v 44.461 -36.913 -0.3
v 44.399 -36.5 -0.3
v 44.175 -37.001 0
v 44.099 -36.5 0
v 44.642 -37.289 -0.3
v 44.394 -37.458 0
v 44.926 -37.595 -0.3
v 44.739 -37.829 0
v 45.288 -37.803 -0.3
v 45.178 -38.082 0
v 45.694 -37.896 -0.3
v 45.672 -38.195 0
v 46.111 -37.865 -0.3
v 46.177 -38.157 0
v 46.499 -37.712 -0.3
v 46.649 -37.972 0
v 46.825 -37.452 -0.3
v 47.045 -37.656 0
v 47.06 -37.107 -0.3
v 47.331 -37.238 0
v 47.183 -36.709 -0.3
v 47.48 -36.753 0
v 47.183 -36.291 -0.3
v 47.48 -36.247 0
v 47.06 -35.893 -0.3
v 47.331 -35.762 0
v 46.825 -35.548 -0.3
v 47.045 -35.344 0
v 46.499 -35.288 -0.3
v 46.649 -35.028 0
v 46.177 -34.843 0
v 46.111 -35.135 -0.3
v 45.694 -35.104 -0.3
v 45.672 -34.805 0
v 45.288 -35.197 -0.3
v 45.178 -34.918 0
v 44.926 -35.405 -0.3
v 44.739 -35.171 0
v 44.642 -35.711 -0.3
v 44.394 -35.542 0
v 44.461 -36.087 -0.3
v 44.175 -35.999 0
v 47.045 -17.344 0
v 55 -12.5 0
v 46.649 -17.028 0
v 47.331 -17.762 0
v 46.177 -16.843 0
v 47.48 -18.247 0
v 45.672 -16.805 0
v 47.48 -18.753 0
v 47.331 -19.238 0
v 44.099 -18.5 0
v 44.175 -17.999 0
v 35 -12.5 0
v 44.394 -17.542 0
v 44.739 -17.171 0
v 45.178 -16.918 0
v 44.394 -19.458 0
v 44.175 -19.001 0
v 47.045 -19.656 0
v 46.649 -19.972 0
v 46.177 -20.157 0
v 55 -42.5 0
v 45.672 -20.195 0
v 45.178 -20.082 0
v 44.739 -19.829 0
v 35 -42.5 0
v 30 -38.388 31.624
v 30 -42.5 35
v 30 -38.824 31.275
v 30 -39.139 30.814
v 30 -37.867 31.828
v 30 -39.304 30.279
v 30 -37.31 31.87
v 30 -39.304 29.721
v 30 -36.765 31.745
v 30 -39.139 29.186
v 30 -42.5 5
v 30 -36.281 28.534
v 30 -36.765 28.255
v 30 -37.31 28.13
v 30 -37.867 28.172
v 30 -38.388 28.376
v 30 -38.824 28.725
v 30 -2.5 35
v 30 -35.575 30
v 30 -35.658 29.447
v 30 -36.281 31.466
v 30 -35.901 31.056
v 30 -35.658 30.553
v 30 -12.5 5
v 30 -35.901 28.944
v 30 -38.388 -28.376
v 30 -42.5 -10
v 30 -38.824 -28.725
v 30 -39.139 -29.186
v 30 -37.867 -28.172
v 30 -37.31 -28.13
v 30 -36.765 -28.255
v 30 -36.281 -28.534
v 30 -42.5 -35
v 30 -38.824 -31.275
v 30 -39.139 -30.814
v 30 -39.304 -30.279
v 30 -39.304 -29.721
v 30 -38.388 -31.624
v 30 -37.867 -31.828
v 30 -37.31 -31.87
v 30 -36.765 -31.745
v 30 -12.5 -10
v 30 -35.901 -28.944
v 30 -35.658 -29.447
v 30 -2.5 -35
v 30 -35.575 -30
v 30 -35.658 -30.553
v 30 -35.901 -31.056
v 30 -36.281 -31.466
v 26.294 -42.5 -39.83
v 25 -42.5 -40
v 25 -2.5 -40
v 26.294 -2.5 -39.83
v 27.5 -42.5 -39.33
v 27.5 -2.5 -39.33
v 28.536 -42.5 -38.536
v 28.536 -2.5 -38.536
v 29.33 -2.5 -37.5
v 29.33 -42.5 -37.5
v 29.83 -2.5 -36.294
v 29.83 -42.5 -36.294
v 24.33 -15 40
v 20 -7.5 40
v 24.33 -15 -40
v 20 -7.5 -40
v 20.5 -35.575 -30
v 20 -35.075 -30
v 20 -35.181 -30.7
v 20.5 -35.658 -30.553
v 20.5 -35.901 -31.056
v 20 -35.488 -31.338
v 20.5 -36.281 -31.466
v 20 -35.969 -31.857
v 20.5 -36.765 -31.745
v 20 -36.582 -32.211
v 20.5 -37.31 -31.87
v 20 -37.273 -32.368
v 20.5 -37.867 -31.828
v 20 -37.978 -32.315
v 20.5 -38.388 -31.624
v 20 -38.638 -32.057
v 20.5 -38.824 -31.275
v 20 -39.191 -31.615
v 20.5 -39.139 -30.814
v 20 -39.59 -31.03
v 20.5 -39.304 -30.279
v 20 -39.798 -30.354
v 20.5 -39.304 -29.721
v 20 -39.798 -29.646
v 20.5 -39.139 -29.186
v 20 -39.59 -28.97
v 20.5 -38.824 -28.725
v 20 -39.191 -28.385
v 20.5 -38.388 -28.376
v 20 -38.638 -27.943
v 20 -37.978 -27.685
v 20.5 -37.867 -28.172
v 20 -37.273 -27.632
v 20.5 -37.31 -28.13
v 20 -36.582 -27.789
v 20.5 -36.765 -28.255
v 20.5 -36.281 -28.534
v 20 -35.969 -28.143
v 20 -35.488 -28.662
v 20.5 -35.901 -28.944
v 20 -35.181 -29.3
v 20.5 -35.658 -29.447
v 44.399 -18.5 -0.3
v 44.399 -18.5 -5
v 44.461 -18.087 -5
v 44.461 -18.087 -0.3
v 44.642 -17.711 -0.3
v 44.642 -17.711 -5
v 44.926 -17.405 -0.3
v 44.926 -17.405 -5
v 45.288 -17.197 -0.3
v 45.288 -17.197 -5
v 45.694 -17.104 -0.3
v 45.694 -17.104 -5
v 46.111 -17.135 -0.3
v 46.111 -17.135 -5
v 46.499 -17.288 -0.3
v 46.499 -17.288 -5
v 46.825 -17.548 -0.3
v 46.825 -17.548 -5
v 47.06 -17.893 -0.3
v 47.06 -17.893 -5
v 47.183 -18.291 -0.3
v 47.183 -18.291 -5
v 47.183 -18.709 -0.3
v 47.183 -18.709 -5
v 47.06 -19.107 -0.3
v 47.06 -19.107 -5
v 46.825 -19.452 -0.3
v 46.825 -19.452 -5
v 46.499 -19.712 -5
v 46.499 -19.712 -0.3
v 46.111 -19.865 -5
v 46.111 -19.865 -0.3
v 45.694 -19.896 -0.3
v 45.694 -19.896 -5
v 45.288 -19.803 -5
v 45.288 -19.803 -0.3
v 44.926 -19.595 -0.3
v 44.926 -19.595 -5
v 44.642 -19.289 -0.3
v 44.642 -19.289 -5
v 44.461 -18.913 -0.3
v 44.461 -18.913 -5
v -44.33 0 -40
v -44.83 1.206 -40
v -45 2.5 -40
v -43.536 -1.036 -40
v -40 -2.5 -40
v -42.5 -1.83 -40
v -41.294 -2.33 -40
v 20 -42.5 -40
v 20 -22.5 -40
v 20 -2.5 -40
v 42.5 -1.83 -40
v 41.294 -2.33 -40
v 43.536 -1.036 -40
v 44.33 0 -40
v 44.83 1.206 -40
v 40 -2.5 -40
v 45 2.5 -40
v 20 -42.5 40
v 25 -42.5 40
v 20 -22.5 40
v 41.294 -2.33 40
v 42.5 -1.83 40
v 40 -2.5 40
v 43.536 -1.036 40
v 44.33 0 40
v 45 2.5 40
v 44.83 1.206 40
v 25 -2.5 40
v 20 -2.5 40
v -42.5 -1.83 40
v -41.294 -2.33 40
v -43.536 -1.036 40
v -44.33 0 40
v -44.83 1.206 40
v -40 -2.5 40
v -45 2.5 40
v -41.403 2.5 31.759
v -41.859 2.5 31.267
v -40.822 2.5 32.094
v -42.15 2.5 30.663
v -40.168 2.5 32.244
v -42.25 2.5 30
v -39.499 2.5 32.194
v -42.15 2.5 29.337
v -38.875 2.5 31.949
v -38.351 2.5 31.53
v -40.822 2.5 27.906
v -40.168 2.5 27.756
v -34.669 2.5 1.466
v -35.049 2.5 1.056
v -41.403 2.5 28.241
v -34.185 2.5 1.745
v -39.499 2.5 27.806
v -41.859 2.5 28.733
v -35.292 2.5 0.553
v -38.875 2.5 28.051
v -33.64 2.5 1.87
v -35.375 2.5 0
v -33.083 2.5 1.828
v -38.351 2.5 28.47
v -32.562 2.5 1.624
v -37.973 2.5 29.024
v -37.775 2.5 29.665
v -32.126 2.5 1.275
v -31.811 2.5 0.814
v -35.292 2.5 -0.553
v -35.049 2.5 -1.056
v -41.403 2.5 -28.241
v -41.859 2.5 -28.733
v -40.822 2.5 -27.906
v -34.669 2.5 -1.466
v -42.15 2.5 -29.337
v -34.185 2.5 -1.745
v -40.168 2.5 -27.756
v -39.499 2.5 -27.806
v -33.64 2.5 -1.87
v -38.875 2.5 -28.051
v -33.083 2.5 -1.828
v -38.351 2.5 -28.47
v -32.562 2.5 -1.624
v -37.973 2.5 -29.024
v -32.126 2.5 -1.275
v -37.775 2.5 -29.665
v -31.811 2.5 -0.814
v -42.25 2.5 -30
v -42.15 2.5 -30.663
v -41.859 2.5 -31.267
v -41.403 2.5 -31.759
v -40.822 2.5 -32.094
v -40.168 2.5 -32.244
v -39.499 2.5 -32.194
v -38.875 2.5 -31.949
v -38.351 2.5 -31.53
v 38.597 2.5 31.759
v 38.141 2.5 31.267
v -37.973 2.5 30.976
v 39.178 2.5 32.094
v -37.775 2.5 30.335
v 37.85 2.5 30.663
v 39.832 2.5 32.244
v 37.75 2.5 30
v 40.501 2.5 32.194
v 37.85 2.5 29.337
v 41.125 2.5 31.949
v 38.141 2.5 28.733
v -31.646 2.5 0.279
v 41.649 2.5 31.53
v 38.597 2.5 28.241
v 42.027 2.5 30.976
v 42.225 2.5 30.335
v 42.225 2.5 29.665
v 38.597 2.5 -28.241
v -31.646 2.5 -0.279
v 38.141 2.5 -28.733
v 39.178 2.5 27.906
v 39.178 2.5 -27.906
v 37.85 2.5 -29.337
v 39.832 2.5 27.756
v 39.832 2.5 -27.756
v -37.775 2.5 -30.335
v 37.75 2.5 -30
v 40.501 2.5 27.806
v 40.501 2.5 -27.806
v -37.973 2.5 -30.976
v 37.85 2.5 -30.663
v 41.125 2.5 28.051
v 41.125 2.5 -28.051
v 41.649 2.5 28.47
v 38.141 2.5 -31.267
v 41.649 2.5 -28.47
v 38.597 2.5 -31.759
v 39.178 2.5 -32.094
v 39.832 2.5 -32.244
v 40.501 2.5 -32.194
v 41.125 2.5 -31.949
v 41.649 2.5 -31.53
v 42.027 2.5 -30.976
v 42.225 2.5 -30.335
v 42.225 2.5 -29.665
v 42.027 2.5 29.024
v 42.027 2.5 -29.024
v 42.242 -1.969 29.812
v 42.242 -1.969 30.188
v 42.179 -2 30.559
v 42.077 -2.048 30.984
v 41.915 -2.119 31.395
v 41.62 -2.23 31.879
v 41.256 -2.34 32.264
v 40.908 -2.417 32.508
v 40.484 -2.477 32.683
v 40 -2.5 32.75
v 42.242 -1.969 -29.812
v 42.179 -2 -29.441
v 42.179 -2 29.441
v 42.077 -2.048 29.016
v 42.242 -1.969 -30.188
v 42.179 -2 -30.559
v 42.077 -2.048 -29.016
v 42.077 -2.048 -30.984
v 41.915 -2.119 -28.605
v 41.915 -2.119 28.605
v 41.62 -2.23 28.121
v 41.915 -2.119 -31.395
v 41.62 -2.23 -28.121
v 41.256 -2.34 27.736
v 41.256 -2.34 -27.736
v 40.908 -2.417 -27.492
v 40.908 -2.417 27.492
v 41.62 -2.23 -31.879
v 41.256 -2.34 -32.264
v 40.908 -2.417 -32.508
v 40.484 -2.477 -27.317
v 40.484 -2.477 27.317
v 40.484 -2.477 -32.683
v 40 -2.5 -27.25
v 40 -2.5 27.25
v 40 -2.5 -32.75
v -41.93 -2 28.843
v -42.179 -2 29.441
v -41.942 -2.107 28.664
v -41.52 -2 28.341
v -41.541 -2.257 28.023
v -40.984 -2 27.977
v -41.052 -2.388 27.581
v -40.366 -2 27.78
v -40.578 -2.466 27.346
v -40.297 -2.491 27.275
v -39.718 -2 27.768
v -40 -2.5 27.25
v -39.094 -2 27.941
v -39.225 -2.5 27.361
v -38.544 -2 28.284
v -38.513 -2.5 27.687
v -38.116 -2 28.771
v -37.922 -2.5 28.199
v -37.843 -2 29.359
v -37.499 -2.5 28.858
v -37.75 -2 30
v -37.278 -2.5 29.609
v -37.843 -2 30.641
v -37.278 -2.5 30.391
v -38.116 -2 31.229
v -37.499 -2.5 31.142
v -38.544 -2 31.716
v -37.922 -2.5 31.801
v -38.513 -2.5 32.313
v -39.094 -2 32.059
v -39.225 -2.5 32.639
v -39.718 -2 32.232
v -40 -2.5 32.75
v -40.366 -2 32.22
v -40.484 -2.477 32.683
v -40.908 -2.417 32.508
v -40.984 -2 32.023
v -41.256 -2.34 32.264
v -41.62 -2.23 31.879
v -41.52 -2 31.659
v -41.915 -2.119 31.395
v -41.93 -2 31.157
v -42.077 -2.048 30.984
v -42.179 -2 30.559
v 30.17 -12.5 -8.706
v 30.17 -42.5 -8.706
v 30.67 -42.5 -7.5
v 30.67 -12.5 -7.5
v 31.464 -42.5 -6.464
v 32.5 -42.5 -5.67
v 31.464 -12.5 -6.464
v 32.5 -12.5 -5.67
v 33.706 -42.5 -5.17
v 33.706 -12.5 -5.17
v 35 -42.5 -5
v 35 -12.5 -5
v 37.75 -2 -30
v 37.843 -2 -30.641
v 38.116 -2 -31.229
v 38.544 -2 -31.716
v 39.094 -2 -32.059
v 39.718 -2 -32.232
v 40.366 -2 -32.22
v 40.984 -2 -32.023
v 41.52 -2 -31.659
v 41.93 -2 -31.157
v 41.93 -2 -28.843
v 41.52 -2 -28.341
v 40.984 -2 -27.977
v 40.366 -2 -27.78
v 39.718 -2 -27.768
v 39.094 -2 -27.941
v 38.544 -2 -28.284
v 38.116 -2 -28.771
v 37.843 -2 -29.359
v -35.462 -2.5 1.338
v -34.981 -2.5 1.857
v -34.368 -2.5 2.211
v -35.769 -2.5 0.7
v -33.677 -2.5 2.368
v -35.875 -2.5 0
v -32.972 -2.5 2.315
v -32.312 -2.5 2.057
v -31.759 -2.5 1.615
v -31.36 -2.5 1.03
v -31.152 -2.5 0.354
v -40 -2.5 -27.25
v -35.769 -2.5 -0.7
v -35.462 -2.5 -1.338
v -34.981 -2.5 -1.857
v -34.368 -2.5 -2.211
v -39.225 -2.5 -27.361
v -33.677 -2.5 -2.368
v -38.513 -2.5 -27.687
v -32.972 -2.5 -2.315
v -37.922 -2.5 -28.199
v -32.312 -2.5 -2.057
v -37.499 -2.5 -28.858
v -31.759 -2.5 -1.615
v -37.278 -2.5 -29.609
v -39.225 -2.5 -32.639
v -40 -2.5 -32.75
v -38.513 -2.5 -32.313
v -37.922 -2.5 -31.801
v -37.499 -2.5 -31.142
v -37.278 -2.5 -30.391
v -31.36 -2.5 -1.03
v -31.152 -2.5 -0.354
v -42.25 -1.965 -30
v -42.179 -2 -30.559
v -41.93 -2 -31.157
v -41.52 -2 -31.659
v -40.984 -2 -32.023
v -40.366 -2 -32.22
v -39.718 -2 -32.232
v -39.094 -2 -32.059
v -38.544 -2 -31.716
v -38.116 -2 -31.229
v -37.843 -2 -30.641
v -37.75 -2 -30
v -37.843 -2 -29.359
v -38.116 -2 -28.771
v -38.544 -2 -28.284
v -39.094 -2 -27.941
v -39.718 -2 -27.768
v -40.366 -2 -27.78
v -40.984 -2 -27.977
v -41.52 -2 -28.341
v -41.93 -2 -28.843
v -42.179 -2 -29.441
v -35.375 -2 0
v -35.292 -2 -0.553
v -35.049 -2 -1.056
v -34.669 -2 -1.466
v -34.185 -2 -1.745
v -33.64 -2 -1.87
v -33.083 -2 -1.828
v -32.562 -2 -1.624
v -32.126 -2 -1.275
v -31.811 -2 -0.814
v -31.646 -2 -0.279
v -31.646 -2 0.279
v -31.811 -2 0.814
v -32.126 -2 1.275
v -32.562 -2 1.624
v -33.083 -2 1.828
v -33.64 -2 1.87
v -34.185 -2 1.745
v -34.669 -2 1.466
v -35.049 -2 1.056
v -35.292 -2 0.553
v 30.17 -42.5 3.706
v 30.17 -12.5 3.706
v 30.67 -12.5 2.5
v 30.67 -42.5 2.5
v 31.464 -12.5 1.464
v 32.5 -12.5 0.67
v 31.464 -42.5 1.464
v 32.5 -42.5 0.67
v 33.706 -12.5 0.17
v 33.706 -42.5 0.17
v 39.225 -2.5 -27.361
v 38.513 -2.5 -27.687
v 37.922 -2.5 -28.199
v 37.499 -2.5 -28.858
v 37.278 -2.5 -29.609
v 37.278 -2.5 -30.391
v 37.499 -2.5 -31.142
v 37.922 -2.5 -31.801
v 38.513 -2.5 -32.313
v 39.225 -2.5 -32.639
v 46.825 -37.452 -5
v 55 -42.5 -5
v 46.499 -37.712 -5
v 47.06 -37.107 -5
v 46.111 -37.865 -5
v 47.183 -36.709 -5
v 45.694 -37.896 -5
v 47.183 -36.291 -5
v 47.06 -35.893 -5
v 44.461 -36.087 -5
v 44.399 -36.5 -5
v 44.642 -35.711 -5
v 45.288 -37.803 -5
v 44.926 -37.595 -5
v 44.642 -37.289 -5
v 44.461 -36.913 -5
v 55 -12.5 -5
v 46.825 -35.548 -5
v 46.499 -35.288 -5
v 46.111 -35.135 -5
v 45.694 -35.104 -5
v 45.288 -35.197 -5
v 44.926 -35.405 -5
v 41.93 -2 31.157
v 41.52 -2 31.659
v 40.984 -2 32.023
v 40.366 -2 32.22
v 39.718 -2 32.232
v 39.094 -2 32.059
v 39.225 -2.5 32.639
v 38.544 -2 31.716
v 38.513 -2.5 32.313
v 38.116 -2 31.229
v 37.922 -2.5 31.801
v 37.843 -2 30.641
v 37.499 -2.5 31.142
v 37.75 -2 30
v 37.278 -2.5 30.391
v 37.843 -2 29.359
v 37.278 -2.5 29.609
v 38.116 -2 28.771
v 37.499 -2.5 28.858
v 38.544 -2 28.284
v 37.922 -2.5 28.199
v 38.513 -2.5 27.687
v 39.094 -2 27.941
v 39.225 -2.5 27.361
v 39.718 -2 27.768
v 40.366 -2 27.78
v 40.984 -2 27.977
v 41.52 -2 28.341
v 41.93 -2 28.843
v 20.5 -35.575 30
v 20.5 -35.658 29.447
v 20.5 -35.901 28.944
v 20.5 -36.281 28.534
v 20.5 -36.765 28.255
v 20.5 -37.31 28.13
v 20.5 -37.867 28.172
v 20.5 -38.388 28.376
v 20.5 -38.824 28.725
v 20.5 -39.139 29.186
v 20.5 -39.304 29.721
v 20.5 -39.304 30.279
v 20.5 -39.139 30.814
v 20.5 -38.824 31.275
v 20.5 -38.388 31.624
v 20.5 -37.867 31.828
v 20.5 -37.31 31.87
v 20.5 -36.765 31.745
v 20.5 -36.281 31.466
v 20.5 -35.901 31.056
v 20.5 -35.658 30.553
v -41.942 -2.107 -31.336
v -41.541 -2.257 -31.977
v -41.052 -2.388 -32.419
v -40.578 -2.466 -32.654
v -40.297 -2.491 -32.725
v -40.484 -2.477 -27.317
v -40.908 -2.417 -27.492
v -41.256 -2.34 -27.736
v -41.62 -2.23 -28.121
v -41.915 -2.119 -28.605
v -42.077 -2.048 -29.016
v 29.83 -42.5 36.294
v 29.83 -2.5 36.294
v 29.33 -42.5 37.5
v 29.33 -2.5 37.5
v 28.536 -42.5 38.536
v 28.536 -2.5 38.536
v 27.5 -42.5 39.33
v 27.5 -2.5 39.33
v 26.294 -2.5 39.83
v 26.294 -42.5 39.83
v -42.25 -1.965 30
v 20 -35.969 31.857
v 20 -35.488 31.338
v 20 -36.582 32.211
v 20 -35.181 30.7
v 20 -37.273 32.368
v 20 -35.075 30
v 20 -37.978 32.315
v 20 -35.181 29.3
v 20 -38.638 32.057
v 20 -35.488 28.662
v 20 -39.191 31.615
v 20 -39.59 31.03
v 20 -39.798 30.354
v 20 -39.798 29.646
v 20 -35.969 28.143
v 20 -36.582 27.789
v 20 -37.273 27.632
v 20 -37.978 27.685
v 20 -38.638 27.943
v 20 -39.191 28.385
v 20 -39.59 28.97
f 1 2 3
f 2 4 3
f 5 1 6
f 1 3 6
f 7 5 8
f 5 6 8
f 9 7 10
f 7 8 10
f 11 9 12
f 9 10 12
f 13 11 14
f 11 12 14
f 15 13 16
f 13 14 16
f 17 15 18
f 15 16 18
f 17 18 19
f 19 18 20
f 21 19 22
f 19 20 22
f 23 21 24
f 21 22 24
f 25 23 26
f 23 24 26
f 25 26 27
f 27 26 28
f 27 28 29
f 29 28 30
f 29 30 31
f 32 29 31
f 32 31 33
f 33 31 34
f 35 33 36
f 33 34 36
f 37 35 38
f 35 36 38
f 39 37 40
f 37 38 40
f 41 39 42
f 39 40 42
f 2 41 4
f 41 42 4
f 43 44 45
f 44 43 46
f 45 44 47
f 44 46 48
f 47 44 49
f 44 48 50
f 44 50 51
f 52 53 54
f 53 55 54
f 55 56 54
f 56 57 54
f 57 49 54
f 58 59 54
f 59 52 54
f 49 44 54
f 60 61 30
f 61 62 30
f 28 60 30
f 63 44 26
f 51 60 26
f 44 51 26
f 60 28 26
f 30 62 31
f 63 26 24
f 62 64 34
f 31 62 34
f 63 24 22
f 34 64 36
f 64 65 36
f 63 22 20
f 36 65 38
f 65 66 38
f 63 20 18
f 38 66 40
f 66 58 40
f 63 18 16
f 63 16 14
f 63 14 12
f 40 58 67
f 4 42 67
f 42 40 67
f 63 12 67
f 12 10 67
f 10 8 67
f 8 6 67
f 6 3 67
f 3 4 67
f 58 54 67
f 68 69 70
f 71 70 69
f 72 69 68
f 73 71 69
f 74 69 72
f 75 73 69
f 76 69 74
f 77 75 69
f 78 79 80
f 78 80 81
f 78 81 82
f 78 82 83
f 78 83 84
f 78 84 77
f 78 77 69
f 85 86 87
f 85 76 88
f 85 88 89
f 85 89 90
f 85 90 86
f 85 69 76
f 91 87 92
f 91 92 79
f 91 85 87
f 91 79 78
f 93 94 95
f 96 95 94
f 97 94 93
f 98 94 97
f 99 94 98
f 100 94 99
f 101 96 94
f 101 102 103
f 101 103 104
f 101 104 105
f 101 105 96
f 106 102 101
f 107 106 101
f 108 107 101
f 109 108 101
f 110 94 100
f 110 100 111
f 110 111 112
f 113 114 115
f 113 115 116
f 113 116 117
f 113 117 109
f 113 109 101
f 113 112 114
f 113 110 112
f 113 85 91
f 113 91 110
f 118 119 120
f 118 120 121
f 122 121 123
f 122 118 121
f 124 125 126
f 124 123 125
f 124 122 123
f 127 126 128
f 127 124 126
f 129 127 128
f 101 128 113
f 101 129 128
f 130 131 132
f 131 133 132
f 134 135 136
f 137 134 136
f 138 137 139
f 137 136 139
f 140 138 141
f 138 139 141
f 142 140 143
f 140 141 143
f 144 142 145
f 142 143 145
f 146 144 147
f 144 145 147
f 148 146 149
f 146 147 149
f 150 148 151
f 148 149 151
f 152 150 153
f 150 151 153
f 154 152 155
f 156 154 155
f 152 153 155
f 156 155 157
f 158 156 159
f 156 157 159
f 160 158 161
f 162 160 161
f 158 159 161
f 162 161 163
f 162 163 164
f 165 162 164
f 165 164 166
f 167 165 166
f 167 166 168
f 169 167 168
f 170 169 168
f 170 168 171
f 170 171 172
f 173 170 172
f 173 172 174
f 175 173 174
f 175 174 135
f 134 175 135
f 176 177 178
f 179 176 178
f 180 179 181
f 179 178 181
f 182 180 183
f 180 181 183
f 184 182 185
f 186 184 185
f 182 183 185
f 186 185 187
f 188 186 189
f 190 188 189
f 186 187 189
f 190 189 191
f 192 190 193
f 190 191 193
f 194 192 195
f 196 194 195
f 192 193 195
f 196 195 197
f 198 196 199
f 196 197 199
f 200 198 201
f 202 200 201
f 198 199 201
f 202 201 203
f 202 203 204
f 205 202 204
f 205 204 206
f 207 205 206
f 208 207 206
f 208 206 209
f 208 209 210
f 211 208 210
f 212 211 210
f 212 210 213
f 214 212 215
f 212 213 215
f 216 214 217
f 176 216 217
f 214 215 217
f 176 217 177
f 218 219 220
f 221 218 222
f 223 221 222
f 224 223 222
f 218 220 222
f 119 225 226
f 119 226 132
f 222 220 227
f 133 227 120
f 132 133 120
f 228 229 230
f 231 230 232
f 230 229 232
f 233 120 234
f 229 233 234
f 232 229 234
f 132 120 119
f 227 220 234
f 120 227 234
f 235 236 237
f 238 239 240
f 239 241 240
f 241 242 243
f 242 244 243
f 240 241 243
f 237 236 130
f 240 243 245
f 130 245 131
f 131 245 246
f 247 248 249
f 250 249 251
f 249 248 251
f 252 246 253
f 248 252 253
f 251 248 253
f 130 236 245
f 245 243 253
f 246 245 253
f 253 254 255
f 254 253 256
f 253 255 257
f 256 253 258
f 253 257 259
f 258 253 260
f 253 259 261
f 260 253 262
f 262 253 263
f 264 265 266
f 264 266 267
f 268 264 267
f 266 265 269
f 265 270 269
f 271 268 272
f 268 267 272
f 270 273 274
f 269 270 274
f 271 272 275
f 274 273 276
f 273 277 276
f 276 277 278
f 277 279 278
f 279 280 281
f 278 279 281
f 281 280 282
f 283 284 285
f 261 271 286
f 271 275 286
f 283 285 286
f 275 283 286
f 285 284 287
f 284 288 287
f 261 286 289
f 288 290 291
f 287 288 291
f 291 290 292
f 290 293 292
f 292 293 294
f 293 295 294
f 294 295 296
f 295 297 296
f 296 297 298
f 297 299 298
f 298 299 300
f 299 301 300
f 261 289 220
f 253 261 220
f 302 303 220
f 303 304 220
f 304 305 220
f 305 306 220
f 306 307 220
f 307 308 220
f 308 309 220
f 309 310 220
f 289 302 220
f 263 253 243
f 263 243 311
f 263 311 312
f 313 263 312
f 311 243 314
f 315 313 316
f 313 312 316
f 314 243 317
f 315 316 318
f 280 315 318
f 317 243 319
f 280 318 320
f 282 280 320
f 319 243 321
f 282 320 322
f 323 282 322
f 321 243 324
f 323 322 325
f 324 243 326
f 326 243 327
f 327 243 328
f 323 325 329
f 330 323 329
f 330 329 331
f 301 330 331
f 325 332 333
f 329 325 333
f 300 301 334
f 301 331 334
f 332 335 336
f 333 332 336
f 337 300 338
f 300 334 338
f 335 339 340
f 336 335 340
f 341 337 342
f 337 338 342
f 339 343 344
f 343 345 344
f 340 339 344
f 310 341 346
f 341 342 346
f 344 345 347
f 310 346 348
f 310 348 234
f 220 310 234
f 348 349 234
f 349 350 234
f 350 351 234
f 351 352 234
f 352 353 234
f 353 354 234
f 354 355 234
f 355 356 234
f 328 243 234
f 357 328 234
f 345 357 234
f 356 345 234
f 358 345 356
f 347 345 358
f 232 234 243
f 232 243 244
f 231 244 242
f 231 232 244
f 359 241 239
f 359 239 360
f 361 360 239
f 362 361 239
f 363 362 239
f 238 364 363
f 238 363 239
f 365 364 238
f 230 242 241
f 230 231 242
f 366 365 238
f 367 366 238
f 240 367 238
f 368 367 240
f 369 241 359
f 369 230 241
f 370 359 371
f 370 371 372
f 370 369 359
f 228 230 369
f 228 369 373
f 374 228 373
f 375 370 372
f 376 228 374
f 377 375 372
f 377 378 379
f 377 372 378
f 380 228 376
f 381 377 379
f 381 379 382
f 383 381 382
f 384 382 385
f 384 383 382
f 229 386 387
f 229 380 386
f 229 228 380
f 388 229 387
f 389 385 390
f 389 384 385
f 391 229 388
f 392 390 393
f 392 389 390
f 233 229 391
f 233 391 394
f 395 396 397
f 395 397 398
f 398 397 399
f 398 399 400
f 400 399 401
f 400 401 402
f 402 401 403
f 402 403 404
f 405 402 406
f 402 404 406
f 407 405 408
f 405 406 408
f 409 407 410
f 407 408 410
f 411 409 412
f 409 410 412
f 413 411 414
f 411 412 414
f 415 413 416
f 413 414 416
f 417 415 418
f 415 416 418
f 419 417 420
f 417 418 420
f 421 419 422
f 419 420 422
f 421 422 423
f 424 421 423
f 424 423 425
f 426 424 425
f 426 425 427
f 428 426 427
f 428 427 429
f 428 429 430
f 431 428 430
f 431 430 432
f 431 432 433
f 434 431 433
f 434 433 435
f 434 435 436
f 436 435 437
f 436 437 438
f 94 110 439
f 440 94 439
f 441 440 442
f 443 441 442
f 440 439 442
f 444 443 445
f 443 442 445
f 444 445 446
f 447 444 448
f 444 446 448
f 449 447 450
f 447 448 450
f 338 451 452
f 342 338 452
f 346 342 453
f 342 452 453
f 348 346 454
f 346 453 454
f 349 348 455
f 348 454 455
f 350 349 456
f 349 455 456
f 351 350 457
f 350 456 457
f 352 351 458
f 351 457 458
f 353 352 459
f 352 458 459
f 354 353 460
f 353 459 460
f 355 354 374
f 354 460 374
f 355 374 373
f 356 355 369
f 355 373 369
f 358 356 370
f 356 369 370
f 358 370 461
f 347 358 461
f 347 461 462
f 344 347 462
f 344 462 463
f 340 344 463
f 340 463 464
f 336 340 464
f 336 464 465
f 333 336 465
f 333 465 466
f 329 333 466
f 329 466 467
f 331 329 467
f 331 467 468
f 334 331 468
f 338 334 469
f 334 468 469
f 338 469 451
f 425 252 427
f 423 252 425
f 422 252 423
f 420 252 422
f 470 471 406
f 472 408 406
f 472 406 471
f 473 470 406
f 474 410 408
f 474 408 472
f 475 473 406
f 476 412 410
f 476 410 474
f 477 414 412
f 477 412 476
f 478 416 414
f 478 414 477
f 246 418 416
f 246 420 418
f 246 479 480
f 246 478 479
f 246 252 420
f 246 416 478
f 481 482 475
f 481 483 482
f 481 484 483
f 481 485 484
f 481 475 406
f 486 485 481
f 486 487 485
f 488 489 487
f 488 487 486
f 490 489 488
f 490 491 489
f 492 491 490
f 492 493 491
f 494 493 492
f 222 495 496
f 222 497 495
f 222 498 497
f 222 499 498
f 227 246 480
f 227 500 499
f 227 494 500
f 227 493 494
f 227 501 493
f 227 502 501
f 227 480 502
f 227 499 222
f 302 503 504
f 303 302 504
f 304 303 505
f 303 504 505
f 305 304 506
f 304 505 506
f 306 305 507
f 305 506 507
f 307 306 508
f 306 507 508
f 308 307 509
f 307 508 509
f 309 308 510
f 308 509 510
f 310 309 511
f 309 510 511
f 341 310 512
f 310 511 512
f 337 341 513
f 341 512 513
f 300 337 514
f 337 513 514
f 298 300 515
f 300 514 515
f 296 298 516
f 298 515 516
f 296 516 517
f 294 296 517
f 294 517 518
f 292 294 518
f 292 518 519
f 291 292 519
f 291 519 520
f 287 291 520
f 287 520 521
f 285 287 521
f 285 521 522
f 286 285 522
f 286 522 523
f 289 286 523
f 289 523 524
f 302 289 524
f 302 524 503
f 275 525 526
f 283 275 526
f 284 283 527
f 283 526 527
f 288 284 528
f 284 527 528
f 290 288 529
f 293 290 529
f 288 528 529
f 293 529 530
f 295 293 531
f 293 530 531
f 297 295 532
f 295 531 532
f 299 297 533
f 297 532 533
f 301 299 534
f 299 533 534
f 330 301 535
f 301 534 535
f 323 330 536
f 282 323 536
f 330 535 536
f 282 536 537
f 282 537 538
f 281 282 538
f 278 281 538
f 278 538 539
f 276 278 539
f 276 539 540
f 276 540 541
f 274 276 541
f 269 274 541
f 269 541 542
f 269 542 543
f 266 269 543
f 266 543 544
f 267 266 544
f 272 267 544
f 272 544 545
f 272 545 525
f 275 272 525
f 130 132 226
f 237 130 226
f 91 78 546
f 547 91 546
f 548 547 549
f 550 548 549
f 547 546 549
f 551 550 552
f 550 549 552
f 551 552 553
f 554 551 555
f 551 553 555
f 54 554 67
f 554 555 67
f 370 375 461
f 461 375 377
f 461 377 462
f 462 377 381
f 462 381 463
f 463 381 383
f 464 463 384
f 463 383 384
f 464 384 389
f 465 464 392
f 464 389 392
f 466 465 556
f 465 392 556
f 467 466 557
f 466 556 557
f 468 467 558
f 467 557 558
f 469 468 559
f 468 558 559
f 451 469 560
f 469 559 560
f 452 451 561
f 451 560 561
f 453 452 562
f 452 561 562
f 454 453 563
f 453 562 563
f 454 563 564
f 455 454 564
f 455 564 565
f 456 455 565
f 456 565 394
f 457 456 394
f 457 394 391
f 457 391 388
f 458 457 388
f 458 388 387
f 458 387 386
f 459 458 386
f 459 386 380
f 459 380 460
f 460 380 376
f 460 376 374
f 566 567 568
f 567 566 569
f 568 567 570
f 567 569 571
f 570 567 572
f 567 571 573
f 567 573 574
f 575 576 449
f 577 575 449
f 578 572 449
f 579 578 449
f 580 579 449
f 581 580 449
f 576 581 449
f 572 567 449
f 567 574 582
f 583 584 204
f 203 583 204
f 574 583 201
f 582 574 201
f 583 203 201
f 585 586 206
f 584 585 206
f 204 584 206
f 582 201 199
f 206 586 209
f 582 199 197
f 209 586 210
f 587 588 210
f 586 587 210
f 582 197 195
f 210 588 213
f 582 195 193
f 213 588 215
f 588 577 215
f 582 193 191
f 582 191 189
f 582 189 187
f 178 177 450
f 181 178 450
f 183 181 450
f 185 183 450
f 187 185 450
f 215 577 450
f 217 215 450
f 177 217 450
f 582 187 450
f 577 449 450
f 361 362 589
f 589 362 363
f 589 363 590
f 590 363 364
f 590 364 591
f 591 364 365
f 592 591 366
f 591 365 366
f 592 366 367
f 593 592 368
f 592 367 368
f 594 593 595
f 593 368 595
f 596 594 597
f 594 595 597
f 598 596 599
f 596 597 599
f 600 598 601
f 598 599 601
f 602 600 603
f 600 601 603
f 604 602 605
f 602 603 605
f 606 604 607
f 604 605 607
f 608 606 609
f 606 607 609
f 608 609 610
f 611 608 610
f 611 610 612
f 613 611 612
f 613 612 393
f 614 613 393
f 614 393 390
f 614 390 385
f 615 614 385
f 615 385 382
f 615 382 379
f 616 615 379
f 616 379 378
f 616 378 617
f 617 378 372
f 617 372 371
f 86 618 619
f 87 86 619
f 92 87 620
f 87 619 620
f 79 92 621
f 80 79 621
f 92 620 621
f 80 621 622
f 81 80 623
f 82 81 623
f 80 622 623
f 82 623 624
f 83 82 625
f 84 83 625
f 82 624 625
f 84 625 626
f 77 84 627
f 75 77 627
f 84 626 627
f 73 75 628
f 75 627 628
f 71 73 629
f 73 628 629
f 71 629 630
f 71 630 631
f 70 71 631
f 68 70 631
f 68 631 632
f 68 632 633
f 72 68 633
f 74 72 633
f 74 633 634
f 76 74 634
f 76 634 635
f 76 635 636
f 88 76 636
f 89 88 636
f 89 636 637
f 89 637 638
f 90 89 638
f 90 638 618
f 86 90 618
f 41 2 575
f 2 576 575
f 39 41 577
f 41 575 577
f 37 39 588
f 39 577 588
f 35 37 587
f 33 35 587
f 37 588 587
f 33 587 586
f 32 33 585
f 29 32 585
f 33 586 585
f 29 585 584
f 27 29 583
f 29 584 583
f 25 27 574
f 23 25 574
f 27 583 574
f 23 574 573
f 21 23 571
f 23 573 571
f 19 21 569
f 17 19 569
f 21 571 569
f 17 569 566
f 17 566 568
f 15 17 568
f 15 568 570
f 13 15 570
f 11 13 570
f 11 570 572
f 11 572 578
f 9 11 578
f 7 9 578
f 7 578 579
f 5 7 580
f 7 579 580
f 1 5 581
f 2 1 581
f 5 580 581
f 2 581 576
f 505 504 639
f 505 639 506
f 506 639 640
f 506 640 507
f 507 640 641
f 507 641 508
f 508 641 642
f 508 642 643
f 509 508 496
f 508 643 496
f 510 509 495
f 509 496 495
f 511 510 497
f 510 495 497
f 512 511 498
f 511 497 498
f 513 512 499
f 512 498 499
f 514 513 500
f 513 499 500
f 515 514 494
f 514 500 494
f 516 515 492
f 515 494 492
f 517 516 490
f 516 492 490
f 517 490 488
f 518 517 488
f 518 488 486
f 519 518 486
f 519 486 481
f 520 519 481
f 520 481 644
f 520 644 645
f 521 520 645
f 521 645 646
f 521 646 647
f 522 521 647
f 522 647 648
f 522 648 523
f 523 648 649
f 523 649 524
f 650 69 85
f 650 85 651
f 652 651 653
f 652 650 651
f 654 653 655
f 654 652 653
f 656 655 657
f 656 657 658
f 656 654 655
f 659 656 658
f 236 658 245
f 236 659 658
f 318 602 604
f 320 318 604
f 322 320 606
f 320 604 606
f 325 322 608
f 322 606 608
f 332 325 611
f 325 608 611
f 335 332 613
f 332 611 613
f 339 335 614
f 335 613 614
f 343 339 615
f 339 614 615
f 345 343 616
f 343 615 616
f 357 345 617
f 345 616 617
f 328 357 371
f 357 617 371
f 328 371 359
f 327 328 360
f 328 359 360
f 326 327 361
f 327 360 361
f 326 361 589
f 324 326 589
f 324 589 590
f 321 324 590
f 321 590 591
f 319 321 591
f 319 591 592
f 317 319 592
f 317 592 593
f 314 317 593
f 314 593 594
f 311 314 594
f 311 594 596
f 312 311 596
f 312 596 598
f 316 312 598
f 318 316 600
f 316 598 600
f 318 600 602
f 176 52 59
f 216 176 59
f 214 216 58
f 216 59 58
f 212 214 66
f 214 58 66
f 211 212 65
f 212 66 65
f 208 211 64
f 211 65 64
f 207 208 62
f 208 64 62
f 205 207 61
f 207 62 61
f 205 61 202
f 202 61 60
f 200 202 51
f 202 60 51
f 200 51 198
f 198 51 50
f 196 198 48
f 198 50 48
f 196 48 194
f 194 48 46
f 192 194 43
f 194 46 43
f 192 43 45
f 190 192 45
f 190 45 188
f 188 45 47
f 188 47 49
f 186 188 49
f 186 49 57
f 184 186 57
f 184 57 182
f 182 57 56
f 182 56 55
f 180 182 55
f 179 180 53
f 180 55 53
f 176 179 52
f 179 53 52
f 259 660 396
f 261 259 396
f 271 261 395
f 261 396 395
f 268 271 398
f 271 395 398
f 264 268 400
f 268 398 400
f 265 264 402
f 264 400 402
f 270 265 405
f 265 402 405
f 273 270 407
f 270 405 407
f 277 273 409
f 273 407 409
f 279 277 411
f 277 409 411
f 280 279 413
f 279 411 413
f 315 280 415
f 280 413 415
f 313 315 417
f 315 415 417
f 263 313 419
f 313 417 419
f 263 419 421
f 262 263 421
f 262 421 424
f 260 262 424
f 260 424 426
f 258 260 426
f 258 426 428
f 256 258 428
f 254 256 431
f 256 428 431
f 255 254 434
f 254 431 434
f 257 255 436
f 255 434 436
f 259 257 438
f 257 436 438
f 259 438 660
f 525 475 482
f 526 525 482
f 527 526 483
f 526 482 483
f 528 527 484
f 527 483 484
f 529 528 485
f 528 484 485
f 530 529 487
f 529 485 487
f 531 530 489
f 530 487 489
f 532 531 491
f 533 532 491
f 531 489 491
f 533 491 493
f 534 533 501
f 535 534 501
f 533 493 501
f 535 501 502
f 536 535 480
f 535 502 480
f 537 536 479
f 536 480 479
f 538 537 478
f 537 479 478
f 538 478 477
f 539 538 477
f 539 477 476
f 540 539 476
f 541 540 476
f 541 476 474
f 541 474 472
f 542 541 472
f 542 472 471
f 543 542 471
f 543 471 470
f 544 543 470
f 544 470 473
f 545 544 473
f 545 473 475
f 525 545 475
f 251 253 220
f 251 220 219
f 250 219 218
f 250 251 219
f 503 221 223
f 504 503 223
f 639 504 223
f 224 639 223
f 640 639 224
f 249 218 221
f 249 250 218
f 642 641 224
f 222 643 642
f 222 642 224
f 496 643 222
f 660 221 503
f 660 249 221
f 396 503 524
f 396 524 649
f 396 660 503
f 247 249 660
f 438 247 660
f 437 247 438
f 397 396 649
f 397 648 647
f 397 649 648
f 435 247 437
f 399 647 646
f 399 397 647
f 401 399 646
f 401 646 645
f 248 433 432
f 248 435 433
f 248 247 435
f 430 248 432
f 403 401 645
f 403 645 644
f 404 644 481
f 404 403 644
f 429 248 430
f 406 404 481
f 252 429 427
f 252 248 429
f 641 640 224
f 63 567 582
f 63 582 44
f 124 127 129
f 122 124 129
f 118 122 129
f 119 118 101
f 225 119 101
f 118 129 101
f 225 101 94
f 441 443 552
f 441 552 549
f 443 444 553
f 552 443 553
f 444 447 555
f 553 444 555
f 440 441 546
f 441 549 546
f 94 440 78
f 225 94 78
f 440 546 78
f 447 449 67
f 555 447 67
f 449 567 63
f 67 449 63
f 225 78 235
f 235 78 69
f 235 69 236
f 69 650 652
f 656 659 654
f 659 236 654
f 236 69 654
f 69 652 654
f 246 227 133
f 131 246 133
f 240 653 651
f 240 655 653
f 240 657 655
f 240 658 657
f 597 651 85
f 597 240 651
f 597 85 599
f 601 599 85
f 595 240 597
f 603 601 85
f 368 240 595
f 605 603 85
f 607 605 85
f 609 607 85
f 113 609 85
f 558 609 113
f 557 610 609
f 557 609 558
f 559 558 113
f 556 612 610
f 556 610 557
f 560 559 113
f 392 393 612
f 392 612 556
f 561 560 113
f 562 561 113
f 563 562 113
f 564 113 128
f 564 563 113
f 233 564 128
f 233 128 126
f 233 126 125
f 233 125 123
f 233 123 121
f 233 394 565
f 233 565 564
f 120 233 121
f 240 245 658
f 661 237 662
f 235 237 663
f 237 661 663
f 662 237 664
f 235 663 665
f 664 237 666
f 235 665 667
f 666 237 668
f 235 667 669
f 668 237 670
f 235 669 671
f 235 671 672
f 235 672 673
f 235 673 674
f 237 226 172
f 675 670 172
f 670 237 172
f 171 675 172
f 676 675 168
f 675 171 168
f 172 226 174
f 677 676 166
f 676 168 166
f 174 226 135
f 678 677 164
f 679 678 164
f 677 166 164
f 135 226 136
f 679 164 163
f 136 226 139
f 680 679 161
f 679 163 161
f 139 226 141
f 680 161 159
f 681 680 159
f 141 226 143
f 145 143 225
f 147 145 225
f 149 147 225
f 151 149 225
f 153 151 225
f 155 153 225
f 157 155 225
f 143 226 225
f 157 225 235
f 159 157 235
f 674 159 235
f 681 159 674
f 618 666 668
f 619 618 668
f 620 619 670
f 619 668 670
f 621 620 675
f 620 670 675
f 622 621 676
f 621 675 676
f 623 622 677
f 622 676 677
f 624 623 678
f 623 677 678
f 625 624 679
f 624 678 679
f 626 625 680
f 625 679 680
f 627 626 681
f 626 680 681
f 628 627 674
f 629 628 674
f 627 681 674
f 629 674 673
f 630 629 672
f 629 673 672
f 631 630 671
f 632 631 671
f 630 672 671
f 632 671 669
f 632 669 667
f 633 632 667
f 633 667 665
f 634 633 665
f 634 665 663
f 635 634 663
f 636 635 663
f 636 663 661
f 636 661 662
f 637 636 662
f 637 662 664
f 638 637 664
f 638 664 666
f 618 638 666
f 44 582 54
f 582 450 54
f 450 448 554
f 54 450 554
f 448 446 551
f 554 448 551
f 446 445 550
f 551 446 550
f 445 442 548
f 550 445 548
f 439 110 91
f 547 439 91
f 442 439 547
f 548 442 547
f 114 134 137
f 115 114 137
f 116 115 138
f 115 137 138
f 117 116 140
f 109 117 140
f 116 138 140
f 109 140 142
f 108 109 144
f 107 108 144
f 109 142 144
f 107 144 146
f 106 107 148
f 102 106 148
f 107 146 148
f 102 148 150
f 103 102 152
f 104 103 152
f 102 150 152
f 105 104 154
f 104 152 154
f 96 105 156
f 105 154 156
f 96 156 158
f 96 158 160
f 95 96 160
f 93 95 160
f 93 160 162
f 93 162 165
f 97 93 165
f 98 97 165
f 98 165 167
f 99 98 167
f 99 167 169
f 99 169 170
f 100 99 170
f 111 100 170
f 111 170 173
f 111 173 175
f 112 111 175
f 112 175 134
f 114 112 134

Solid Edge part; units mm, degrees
sketch "Sketch1" plane through (0, 0, 0) normal (0, -1, 0) x (1, 0, 0)
  line L0 (-45, -40) -> (45, -40)
  line L1 (45, -40) -> (45, 40)
  line L2 (45, 40) -> (-45, 40)
  line L3 (-45, 40) -> (-45, -40)
  dimension "D1" = 80
  dimension "D2" = 90
extrude "Protrusion1" add sketch "Sketch1" along normal mid plane 5
sketch "Sketch2" plane through (35, -2.5, 0) normal (0, -1, 0) x (-1, 0, 0)
  circle A0 centre (-5, 30) radius 2.25
  circle A1 centre (75, 30) radius 2.25
  circle A2 centre (75, -30) radius 2.25
  circle A3 centre (-5, -30) radius 2.25
  dimension "D1" = 4.5
  dimension "D2" = 80
  dimension "D3" = 60
extrude "Cutout1" cut sketch "Sketch2" against normal through all
sketch "Sketch3" plane through (0, -2.5, 0) normal (0, -1, 0) x (-1, 0, 0)
  line L0 (-30, 40) -> (-25, 40)
  line L1 (-25, 40) -> (-25, -40)
  line L2 (-25, -40) -> (-30, -40)
  line L3 (-30, -40) -> (-30, 40)
  dimension "D1" = 5
  dimension "D2" = 15
extrude "Extrusionsausprägung_26" add sketch "Sketch3" along normal blind 40
sketch "Sketch4" plane through (0, -20, -40) normal (0, 0, -1) x (-1, 0, 0)
  line L0 (-25, 17.5) -> (-20, 17.5)
  line L1 (-20, 17.5) -> (-20, 12.5)
  line L2 (-20, 12.5) -> (-24.3301, 5)
  line L3 (-24.3301, 5) -> (-20, -2.5)
  line L4 (-20, -2.5) -> (-20, -22.5)
  line L5 (-20, -22.5) -> (-25, -22.5)
  line L6 (-25, -22.5) -> (-25, 17.5)
  dimension "D1" = 5
  dimension "D2" = 20
  dimension "D3" = 12.5
extrude "Protrusion2" add sketch "Sketch4" against normal up to vertex (80 mm away)
sketch "Sketch5" plane through (-12.5, -2.5, 0) normal (0, -1, 0) x (-1, 0, 0)
  circle A0 centre (21, 0) radius 1.875
  dimension "D1" = 3.75
  dimension "D2" = 11.5
extrude "Cutout2" cut sketch "Sketch5" against normal through all
sketch "Sketch6" plane through (20, -32.5, 0) normal (-1, 0, 0) x (0, 1, 0)
  circle A0 centre (-4.95, 30) radius 1.875
  circle A1 centre (-4.95, -30) radius 1.875
  dimension "D1" = 3.75
  dimension "D2" = 60
  dimension "D3" = 5.05
extrude "Cutout3" cut sketch "Sketch6" against normal through all
sketch "Sketch7" plane through (30, -22.5, 0) normal (1, 0, 0) x (0, -1, 0)
  line L0 (20, 5) -> (-10, 5)
  line L1 (-10, 5) -> (-10, 0)
  line L2 (-10, 0) -> (20, 0)
  line L3 (20, 0) -> (20, 5)
  dimension "D1" = 30
  dimension "D2" = 5
  dimension "D3" = 40
extrude "Extrusionsausprägung_28" add sketch "Sketch7" along normal blind 25
sketch "Sketch8" plane through (42.5, -27.5, -5) normal (0, 0, -1) x (-1, 0, 0)
  circle A0 centre (-3.299, 9) radius 1.4
  circle A1 centre (-3.299, -9) radius 1.4
  dimension "D1" = 2.8
  dimension "D2" = 18
  dimension "D3" = 9.201
extrude "Cutout4" cut sketch "Sketch8" against normal through all
chamfer "Fase_6" distance 0.5 angle 45 7 edges at (42.25, -2.5, -30) (42.25, -2.5, 30) (-37.75, -2.5, -30) (-37.75, -2.5, 30) (-31.625, -2.5, 0) (20, -39.325, 30) (20, -39.325, -30)
chamfer "Fase_7" distance 0.3 angle 45 2 edges at (47.199, -18.5, 0) (47.199, -36.5, 0)
fillet "Verrundung_6" radius 5 6 edges at (45, -2.5, 0) (-45, -2.5, 0) (30, -27.5, -5) (30, -27.5, 0) (30, -22.5, -40) (30, -22.5, 40)
properties part number "A7.2" material "Nylon, allgemein"
